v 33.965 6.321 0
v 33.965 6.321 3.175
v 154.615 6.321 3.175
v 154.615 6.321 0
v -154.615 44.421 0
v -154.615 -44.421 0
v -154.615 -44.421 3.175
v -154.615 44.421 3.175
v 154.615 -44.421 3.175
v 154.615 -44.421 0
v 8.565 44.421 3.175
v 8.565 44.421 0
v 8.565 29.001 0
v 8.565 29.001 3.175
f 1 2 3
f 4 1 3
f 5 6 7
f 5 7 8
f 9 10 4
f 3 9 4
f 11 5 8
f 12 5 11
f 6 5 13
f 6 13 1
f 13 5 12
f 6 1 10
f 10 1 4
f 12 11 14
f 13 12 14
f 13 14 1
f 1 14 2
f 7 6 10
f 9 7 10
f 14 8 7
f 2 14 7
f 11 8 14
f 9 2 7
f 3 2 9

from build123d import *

# Parameters (mm, degrees)
SKETCH1_W           = 309.23
SKETCH1_H           = 88.841000118
BOSS_EXTRUDE1_DEPTH = 3.175
CUT_EXTRUDE2_DEPTH  = 161.90077587


with BuildPart() as part:
    # Sketch1 → Boss-Extrude1 (new body)
    with BuildSketch(Plane.XY):
        Rectangle(SKETCH1_W, SKETCH1_H)
    extrude(amount=BOSS_EXTRUDE1_DEPTH)

    # Sketch4 → Cut-Extrude2 (cut, through all)
    with BuildSketch(Plane.XY.offset(3.175)):
        Polygon((33.965, 6.320500059), (154.615, 6.320500059), (154.615, 44.420500059), (8.565, 44.420500059), (8.565, 29.000644342), align=None)
    extrude(amount=-CUT_EXTRUDE2_DEPTH, mode=Mode.SUBTRACT)


solid = part.part
